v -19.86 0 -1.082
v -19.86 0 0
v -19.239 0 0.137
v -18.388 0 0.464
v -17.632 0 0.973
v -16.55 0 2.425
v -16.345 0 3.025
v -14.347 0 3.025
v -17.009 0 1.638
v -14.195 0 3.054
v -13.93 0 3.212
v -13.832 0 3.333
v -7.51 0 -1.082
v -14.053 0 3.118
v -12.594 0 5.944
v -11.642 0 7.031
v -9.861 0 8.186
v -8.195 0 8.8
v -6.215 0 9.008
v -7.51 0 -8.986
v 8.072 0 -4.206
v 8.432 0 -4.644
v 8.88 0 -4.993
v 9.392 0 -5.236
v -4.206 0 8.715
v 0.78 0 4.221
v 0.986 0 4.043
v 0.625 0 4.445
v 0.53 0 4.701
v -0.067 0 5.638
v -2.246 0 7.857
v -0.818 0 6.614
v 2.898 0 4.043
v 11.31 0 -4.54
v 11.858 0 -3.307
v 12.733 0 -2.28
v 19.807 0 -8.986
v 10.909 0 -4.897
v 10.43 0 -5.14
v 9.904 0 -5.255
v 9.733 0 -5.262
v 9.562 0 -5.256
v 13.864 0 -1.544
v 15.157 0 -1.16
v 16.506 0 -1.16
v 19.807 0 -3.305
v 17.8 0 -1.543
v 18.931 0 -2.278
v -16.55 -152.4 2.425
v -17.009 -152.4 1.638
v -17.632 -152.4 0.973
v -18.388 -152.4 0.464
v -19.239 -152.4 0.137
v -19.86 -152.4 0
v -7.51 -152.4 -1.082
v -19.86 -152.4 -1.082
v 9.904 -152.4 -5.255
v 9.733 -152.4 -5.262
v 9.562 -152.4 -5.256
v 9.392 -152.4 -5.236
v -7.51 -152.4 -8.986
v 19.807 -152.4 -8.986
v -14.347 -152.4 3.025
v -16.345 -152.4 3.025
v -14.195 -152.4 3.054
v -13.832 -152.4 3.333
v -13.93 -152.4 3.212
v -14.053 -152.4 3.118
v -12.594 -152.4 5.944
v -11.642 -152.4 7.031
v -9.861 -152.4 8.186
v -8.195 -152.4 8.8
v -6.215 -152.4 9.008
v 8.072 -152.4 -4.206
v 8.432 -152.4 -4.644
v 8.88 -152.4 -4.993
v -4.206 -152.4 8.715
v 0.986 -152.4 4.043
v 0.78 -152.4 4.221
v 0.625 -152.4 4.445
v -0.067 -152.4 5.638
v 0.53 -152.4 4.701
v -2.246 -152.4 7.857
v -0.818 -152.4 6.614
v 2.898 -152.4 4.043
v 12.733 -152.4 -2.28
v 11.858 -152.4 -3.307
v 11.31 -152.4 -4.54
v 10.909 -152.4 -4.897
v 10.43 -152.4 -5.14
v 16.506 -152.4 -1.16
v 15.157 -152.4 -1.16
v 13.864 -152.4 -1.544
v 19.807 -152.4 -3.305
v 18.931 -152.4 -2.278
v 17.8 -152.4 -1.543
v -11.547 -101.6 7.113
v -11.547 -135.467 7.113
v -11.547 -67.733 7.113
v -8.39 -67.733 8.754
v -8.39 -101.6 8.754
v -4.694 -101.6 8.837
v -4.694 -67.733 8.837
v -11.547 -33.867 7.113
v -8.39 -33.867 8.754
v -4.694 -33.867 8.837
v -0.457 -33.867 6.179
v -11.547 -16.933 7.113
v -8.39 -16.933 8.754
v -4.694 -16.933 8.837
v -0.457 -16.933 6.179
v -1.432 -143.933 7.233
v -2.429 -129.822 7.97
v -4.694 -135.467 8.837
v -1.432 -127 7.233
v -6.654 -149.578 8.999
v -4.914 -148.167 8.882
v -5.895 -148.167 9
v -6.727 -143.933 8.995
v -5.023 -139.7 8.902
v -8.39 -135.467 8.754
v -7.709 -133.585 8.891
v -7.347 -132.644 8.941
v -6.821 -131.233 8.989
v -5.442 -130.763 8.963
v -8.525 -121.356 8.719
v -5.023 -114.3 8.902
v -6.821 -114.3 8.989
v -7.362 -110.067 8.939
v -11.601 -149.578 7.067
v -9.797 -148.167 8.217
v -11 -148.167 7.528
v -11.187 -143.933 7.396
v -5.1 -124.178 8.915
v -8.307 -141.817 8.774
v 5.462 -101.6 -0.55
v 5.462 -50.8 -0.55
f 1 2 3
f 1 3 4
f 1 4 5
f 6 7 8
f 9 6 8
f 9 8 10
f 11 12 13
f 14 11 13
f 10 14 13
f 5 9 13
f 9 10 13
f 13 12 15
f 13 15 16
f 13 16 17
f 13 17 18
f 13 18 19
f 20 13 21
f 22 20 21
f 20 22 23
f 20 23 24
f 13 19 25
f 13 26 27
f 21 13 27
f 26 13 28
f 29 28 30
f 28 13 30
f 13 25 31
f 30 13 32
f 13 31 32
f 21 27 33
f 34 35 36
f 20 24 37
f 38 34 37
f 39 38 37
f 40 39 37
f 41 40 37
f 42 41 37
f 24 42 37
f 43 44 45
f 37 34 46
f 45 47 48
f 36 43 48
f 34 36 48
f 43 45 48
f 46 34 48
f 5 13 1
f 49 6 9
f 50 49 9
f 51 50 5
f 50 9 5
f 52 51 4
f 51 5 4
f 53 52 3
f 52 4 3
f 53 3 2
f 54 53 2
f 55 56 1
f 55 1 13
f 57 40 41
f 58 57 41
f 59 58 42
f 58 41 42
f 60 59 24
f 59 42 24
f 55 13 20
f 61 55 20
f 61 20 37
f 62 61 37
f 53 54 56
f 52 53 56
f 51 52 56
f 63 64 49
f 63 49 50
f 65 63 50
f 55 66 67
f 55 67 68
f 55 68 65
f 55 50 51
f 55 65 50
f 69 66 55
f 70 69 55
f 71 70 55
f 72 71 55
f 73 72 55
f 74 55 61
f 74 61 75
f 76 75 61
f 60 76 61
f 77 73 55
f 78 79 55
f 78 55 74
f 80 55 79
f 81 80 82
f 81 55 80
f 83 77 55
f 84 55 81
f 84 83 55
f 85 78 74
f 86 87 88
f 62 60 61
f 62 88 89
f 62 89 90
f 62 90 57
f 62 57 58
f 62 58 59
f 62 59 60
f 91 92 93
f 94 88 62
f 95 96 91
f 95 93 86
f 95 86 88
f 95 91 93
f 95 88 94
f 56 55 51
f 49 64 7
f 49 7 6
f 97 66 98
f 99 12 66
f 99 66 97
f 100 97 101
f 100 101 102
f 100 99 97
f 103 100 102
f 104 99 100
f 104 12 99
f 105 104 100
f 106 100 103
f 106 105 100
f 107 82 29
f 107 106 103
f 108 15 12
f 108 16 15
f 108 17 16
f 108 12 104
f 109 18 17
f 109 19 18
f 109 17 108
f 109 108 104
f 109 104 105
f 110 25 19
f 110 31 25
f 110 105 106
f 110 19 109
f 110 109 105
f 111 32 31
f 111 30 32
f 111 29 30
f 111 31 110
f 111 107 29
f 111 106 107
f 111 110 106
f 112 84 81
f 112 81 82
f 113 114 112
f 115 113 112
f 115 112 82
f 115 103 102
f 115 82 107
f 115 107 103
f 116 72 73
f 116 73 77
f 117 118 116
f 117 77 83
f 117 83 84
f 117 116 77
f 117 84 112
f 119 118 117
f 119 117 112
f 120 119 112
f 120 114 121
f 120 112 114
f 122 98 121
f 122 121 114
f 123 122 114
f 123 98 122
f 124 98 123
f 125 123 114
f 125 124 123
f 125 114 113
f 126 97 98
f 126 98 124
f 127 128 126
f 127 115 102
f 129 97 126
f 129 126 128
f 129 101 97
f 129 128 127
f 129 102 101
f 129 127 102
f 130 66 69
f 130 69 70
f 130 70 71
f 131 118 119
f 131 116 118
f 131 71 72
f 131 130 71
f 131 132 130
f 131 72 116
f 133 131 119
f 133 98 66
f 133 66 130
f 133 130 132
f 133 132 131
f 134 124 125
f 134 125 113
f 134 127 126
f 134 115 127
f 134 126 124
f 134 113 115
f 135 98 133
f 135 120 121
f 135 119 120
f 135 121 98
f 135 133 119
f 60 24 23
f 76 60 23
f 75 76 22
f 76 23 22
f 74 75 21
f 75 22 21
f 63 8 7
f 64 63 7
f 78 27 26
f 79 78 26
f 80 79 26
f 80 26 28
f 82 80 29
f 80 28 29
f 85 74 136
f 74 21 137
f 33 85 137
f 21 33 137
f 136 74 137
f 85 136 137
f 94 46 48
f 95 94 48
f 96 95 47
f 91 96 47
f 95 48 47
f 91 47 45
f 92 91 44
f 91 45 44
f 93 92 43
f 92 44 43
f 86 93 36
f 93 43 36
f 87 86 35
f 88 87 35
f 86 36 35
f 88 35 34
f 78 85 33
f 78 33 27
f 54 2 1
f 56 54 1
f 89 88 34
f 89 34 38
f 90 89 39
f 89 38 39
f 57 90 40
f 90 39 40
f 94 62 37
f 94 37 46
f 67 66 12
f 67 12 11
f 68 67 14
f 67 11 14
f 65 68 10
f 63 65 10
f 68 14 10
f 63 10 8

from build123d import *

# Parameters (mm, degrees)
F1_DEPTH = 152.4


with BuildPart() as f1:
    # F0 (on Front) → F1 (new body)
    with BuildSketch(Plane.XZ):
        with BuildLine():
            Line((19.8069084436, -8.9858053252), (19.8069084436, -3.3050309867))
            ThreePointArc((19.8069084436, -3.3050309867), (15.1571749594, -1.1601694518), (11.3104460761, -4.5399814844))
            ThreePointArc((11.3104460761, -4.5399814844), (10.6768926166, -5.0339136924), (9.9044738541, -5.2546584943))
            ThreePointArc((9.9044738541, -5.2546584943), (9.6477223228, -5.2611896565), (9.3920852396, -5.2364169572))
            ThreePointArc((9.3920852396, -5.2364169572), (8.6463683892, -4.8310441428), (8.0724013437, -4.2057581521))
            add(Edge.make_bspline(
                [(8.0724013437, -4.2057581521), (7.1608183543, -2.9820731576), (5.4553953519, -0.6927582389), (3.7498376037, 2.3114444577), (3.1517848724, 3.5266368089), (2.8978176415, 4.04267665)],
                knots=[0, 0, 0, 0, 0.3978364574, 0.7442870846, 1, 1, 1, 1], degree=3))
            Line((2.8978176415, 4.04267665), (0.9861707222, 4.04267665))
            ThreePointArc((0.9861707222, 4.04267665), (0.6954883956, 4.3283482369), (0.5304833176, 4.7010113485))
            add(Edge.make_bspline(
                [(-13.8320559636, 3.3332875464), (-13.5674155601, 4.0363823338), (-13.0394501992, 5.4390789769), (-11.6700154855, 7.2062381499), (-9.7749837374, 8.2678424283), (-8.4271019856, 8.8160107723), (-6.4968361444, 9.069198167), (-4.6682281269, 8.9286221591), (-2.1728174562, 8.0556916568), (-0.4038300984, 6.2511939782), (0.2272949359, 5.1780230401), (0.5304833176, 4.7010113485)],
                knots=[0, 0, 0, 0, 0.116063506, 0.2314435513, 0.3440206273, 0.4378725973, 0.5437407299, 0.6493453544, 0.7741412451, 0.8966638971, 1, 1, 1, 1], degree=3))
            ThreePointArc((-13.8320559636, 3.3332875464), (-14.0527709948, 3.1176038576), (-14.3472345712, 3.0252687028))
            Line((-14.3472345712, 3.0252687028), (-16.3451433182, 3.0252687028))
            Line((-16.3451433182, 3.0252687028), (-16.5500454605, 2.4251409341))
            ThreePointArc((-16.5500454605, 2.4251409341), (-17.6319559735, 0.9725096977), (-19.2390973375, 0.1371867043))
            Line((-19.2390973375, 0.1371867043), (-19.8597125709, 0))
            Line((-19.8597125709, 0), (-19.8597125709, -1.0821194155))
            Line((-19.8597125709, -1.0821194155), (-7.5102047995, -1.0821194155))
            Line((-7.5102047995, -1.0821194155), (-7.5102047995, -8.9858053252))
            Line((-7.5102047995, -8.9858053252), (19.8069084436, -8.9858053252))
        make_face()
    extrude(amount=F1_DEPTH)


solid = f1.part
